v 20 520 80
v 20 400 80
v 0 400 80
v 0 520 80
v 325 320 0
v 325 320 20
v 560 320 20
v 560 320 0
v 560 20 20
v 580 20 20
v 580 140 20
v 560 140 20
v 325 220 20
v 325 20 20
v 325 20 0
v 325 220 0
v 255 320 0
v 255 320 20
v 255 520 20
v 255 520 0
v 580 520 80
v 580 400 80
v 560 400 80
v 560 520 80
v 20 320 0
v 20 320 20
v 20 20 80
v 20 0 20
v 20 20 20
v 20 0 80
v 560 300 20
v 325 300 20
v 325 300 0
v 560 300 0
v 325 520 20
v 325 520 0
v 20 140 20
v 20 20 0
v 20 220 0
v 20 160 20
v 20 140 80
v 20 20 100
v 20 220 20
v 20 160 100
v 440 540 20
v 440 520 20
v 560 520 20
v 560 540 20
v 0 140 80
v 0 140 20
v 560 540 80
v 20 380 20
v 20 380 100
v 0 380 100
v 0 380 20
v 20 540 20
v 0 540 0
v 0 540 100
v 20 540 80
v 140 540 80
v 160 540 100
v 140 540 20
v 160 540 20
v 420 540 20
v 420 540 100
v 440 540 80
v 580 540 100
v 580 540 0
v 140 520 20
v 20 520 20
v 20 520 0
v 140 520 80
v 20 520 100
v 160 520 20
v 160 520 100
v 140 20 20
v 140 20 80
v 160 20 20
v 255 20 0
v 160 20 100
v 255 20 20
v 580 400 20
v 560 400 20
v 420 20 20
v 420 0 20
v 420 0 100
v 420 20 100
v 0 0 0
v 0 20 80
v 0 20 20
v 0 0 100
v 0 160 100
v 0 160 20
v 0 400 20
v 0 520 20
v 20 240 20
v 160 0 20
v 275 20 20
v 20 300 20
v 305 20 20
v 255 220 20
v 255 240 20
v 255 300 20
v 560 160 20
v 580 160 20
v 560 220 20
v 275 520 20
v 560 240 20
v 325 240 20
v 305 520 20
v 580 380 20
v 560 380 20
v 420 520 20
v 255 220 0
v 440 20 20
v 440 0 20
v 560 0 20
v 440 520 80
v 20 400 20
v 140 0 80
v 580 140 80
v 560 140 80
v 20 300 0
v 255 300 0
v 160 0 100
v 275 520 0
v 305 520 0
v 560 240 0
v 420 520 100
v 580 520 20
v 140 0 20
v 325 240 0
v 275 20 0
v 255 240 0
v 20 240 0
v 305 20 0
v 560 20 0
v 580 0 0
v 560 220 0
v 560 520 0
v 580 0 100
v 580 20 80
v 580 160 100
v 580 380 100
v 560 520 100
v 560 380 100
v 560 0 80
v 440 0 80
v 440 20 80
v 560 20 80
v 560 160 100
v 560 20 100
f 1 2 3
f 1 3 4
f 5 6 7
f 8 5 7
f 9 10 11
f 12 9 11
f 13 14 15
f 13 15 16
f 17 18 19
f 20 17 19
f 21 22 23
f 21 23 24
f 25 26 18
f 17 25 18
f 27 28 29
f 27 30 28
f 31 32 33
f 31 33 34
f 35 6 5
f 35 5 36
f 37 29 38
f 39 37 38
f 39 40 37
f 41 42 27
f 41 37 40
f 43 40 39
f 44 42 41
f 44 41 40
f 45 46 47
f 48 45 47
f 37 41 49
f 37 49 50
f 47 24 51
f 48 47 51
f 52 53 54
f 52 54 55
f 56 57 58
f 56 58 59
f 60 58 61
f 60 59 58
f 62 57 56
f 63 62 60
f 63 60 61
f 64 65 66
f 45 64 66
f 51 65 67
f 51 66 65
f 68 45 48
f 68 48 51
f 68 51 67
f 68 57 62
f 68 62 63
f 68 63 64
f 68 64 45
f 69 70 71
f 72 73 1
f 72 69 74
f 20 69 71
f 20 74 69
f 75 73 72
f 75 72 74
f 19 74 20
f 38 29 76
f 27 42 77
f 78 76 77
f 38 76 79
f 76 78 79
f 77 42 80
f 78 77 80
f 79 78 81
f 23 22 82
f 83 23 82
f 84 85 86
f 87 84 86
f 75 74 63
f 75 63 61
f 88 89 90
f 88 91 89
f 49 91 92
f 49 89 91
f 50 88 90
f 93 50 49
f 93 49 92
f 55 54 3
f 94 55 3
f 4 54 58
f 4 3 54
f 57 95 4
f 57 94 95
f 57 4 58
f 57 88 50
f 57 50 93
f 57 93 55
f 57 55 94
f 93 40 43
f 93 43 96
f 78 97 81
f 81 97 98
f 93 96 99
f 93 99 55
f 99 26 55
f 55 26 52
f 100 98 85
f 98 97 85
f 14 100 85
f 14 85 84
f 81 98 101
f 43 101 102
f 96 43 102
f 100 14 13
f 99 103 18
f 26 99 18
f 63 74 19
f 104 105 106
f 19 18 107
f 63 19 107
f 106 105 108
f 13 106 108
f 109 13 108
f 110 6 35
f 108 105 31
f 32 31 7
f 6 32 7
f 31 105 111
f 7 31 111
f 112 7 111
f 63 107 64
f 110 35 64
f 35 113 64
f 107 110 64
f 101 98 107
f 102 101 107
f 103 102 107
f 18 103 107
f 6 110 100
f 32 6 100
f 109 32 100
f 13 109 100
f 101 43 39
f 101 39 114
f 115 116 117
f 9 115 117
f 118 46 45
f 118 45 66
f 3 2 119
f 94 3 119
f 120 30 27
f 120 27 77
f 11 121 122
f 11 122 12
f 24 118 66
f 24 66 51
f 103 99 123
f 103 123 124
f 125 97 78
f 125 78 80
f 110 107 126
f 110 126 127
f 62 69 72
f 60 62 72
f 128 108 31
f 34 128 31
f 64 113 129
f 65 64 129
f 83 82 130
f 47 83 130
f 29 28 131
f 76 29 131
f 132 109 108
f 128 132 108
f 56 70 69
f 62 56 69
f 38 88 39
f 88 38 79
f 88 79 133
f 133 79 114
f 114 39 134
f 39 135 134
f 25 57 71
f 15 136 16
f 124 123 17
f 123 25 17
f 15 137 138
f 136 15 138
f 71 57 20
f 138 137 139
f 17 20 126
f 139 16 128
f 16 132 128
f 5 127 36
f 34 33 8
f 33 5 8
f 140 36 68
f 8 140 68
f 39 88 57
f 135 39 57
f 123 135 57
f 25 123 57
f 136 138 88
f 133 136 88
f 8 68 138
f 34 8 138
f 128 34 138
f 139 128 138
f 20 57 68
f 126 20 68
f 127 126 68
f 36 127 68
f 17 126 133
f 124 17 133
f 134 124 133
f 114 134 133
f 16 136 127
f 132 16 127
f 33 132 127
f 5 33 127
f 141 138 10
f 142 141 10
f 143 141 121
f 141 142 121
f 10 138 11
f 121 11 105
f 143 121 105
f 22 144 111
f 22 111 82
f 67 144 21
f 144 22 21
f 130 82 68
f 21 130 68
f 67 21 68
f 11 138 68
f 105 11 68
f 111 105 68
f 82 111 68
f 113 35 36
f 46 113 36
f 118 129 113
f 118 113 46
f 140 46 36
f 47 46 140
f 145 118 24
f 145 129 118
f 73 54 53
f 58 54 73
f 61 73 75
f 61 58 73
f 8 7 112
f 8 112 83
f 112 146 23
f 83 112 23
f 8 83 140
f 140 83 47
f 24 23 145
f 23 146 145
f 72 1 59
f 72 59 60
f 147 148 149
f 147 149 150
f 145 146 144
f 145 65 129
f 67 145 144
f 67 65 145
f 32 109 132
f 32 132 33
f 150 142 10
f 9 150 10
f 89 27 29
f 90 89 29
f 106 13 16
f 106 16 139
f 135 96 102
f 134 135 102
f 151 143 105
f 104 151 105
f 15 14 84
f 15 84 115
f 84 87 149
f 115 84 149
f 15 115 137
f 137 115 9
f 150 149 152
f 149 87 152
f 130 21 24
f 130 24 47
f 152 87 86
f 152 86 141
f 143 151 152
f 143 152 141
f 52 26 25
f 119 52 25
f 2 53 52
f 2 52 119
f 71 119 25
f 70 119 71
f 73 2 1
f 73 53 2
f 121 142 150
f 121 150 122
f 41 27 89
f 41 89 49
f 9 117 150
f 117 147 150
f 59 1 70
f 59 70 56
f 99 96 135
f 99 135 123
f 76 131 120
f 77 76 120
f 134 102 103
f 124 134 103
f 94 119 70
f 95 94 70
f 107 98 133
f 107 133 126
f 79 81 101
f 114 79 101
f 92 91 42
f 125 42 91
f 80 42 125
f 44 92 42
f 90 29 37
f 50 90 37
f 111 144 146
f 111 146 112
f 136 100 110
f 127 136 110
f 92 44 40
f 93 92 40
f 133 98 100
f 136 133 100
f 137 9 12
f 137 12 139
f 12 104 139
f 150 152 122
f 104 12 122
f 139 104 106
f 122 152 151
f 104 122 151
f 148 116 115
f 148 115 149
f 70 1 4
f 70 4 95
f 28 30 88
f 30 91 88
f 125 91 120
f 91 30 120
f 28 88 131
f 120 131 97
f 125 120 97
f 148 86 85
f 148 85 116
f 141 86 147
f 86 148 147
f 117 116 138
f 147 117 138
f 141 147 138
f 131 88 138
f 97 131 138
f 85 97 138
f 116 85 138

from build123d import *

# Parameters (mm, degrees)
SKETCH_1_W                       = 580
SKETCH_1_H                       = 540
EXTRUDE_1_DEPTH                  = 100
SHELL_1_T                        = -20
SKETCH_2_W                       = 235
SKETCH_2_H                       = 200
CUT_EXTRUDE_1_DEPTH              = 43
PATTERN_LINEAR_1_COUNT           = 2
PATTERN_LINEAR_1_PITCH           = 305
PATTERN_LINEAR_2_COUNT           = 2
PATTERN_LINEAR_2_PITCH           = 300
PATTERN_LINEAR_3_COPY_1_SKETCH_W = 235
PATTERN_LINEAR_3_COPY_1_SKETCH_H = 200
PATTERN_LINEAR_3_COPY_1_DEPTH    = 43
PATTERN_LINEAR_3_COPY_2_SKETCH_W = 235
PATTERN_LINEAR_3_COPY_2_SKETCH_H = 200
PATTERN_LINEAR_3_COPY_2_DEPTH    = 43
SKETCH_4_W                       = 260
SKETCH_4_H                       = 80
CUT_EXTRUDE_2_DEPTH              = 549
SKETCH_6_W                       = 80
SKETCH_6_H                       = 220
CUT_EXTRUDE_3_DEPTH              = 614
SKETCH_8_W                       = 120
SKETCH_8_H                       = 60
CUT_EXTRUDE_4_DEPTH              = 614
SKETCH_10_W                      = 120
SKETCH_10_H                      = 60
CUT_EXTRUDE_5_DEPTH              = 614
SKETCH_12_W                      = 60
SKETCH_12_H                      = 120
CUT_EXTRUDE_6_DEPTH              = 602
SKETCH_13_W                      = 60
SKETCH_13_H                      = 120
CUT_EXTRUDE_7_DEPTH              = 602
SKETCH_15_W                      = 30
SKETCH_15_H                      = 500
CUT_EXTRUDE_8_DEPTH              = 66
SKETCH_18_W                      = 235
SKETCH_18_H                      = 60
CUT_EXTRUDE_11_DEPTH             = 41
SKETCH_21_W                      = 235
SKETCH_21_H                      = 60
CUT_EXTRUDE_13_DEPTH             = 72


with BuildPart() as part:
    # 草图1 → 凸台-拉伸1 (new body)
    with BuildSketch(Plane.XY):
        with Locations((290, 270)):
            Rectangle(SKETCH_1_W, SKETCH_1_H)
    extrude(amount=EXTRUDE_1_DEPTH)

    # 抽壳1
    shell_1_openings = [part.faces().sort_by_distance(p)[0] for p in [
        (290, 270, 100),
    ]]
    offset(amount=SHELL_1_T, openings=shell_1_openings, kind=Kind.INTERSECTION)

    # 草图2 → 切除-拉伸1 (cut)
    with BuildSketch(Plane.XY.offset(20)):
        with Locations((442.5, 120)):
            Rectangle(SKETCH_2_W, SKETCH_2_H)
    cut_extrude_1 = extrude(amount=-CUT_EXTRUDE_1_DEPTH, mode=Mode.SUBTRACT)

    # 阵列(线性)1: 切除-拉伸1 ×2
    with Locations(*[(-i * PATTERN_LINEAR_1_PITCH, 0, 0) for i in range(1, PATTERN_LINEAR_1_COUNT)]):
        add(cut_extrude_1, mode=Mode.SUBTRACT)

    # 阵列(线性)2: 切除-拉伸1 ×2
    with Locations(*[(0, i * PATTERN_LINEAR_2_PITCH, 0) for i in range(1, PATTERN_LINEAR_2_COUNT)]):
        add(cut_extrude_1, mode=Mode.SUBTRACT)

    # 阵列(线性)3 copy 1 sketch → 阵列(线性)3 copy 1 (cut)
    with BuildSketch(Plane(origin=(-305, 300, 20), x_dir=(1, 0, 0), z_dir=(0, 0, 1))):
        with Locations((442.5, 120)):
            Rectangle(PATTERN_LINEAR_3_COPY_1_SKETCH_W, PATTERN_LINEAR_3_COPY_1_SKETCH_H)
    extrude(amount=-PATTERN_LINEAR_3_COPY_1_DEPTH, mode=Mode.SUBTRACT)

    # 阵列(线性)3 copy 2 sketch → 阵列(线性)3 copy 2 (cut)
    with BuildSketch(Plane(origin=(0, 300, 20), x_dir=(1, 0, 0), z_dir=(0, 0, 1))):
        with Locations((442.5, 120)):
            Rectangle(PATTERN_LINEAR_3_COPY_2_SKETCH_W, PATTERN_LINEAR_3_COPY_2_SKETCH_H)
    extrude(amount=-PATTERN_LINEAR_3_COPY_2_DEPTH, mode=Mode.SUBTRACT)

    # 草图4 → 切除-拉伸2 (cut)
    with BuildSketch(Plane.XZ):
        with Locations((290, 60)):
            Rectangle(SKETCH_4_W, SKETCH_4_H)
    extrude(amount=-CUT_EXTRUDE_2_DEPTH, mode=Mode.SUBTRACT)

    # 草图6 → 切除-拉伸3 (cut)
    with BuildSketch(Plane(origin=(580, 0, 0), x_dir=(0, 0, -1), z_dir=(1, 0, 0))):
        with Locations((-60, 270)):
            Rectangle(SKETCH_6_W, SKETCH_6_H)
    extrude(amount=-CUT_EXTRUDE_3_DEPTH, mode=Mode.SUBTRACT)

    # 草图8 → 切除-拉伸4 (cut)
    with BuildSketch(Plane.XZ):
        with Locations((80, 50)):
            Rectangle(SKETCH_8_W, SKETCH_8_H)
    extrude(amount=-CUT_EXTRUDE_4_DEPTH, mode=Mode.SUBTRACT)

    # 草图10 → 切除-拉伸5 (cut)
    with BuildSketch(Plane.XZ):
        with Locations((500, 50)):
            Rectangle(SKETCH_10_W, SKETCH_10_H)
    extrude(amount=-CUT_EXTRUDE_5_DEPTH, mode=Mode.SUBTRACT)

    # 草图12 → 切除-拉伸6 (cut)
    with BuildSketch(Plane(origin=(580, 0, 0), x_dir=(0, 0, -1), z_dir=(1, 0, 0))):
        with Locations((-50, 460)):
            Rectangle(SKETCH_12_W, SKETCH_12_H)
    extrude(amount=-CUT_EXTRUDE_6_DEPTH, mode=Mode.SUBTRACT)

    # 草图13 → 切除-拉伸7 (cut)
    with BuildSketch(Plane(origin=(580, 0, 0), x_dir=(0, 0, -1), z_dir=(1, 0, 0))):
        with Locations((-50, 80)):
            Rectangle(SKETCH_13_W, SKETCH_13_H)
    extrude(amount=-CUT_EXTRUDE_7_DEPTH, mode=Mode.SUBTRACT)

    # 草图15 → 切除-拉伸8 (cut)
    with BuildSketch(Plane.XY.offset(20)):
        with Locations((290, 270)):
            Rectangle(SKETCH_15_W, SKETCH_15_H)
    extrude(amount=-CUT_EXTRUDE_8_DEPTH, mode=Mode.SUBTRACT)

    # 草图18 → 切除-拉伸11 (cut)
    with BuildSketch(Plane.XY.offset(20)):
        with Locations((137.5, 270)):
            Rectangle(SKETCH_18_W, SKETCH_18_H)
    extrude(amount=-CUT_EXTRUDE_11_DEPTH, mode=Mode.SUBTRACT)

    # 草图21 → 切除-拉伸13 (cut)
    with BuildSketch(Plane.XY.offset(20)):
        with Locations((442.5, 270)):
            Rectangle(SKETCH_21_W, SKETCH_21_H)
    extrude(amount=-CUT_EXTRUDE_13_DEPTH, mode=Mode.SUBTRACT)


solid = part.part
